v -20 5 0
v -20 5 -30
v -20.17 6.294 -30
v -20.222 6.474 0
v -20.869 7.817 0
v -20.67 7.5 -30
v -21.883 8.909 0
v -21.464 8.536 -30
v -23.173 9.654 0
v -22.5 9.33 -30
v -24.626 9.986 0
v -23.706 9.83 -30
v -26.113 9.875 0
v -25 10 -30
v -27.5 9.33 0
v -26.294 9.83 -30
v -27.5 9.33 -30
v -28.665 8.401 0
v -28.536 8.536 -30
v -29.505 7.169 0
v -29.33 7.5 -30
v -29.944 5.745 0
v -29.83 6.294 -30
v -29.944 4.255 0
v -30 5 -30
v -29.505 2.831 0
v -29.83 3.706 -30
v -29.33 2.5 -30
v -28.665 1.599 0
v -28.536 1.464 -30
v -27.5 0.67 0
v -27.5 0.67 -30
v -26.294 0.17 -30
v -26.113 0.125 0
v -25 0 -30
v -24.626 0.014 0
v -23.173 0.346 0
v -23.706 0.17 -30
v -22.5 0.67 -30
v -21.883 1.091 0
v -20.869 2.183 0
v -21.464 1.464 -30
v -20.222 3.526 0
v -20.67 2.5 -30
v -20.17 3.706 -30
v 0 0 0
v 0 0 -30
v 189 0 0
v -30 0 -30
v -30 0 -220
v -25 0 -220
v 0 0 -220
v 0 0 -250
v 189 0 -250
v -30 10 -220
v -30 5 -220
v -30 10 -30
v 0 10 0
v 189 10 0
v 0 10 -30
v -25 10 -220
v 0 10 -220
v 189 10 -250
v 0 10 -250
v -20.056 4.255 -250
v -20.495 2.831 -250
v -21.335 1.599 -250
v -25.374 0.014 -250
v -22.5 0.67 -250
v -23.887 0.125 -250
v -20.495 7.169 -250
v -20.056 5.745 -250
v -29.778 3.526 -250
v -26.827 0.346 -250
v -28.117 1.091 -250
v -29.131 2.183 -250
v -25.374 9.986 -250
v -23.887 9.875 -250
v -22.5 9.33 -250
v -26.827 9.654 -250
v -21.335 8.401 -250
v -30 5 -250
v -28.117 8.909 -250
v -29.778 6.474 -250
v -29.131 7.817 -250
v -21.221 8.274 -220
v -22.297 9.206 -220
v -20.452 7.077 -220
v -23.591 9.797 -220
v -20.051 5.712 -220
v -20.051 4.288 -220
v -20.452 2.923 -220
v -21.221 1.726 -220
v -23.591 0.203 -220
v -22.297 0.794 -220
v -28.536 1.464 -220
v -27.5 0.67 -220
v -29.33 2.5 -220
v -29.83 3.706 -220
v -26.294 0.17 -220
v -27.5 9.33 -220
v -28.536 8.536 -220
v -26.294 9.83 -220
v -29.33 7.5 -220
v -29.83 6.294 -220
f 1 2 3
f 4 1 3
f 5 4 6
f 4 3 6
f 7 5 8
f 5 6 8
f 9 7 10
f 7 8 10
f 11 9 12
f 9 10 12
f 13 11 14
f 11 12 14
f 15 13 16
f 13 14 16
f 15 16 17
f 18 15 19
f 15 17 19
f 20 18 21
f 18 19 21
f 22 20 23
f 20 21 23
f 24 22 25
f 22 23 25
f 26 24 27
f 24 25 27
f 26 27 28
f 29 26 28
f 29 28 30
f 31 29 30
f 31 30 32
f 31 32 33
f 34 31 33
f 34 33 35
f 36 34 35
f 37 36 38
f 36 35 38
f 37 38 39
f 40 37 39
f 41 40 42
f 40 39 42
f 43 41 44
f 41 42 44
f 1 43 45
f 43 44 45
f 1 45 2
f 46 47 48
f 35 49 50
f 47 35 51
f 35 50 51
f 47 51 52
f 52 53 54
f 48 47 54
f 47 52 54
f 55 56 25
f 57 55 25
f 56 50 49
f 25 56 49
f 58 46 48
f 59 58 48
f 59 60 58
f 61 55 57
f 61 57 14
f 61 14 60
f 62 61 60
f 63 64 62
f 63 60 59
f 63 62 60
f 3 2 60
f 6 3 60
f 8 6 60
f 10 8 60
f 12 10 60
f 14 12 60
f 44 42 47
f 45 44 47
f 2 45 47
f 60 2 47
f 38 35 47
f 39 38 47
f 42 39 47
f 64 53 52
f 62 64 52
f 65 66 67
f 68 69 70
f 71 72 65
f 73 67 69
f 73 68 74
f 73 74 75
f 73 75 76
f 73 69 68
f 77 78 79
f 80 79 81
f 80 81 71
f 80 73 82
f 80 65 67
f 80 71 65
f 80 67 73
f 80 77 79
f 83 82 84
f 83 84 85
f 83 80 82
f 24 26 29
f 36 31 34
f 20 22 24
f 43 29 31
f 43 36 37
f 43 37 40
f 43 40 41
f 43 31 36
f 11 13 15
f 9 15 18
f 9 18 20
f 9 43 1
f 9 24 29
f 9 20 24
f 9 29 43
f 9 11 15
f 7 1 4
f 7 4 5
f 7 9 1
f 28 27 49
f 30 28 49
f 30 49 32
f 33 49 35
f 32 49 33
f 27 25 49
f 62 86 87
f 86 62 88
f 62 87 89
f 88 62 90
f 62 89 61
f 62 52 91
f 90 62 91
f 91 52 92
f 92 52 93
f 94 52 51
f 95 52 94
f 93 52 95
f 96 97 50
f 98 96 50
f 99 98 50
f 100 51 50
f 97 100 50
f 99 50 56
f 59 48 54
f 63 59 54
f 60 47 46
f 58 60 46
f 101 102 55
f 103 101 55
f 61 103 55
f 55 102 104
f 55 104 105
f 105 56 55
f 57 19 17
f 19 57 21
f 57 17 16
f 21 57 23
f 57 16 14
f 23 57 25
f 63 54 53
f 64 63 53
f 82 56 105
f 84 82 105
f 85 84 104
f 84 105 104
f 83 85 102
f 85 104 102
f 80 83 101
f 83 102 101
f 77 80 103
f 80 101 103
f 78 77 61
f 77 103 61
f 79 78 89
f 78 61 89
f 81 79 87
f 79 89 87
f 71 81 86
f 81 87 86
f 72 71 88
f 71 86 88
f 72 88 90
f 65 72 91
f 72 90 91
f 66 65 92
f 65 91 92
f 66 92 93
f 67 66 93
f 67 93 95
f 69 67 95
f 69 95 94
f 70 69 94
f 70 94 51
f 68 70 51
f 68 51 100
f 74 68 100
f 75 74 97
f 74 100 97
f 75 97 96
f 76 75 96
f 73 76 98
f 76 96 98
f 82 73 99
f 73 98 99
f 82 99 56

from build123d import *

# Parameters (mm, degrees)
BOSS_EXTRU_1_DEPTH = 10
ESQUISSE2_R        = 5
BOSS_EXTRU_2_DEPTH = 30
ESQUISSE3_R        = 5
BOSS_EXTRU_3_DEPTH = 30


with BuildPart() as part:
    # Esquisse1 → Boss.-Extru.1 (new body)
    with BuildSketch(Plane(origin=(0, 0, 0), x_dir=(1, 0, 0), z_dir=(0, 1, 0))):
        Polygon((0, 0), (189, 0), (189, 250), (0, 250), (0, 220), (-30, 220), (-30, 30), (0, 30), align=None)
    extrude(amount=BOSS_EXTRU_1_DEPTH)

    # Esquisse2 → Boss.-Extru.2 (add)
    with BuildSketch(Plane.XY.offset(-30)):
        with Locations((-25, 5)):
            Circle(ESQUISSE2_R)
    extrude(amount=BOSS_EXTRU_2_DEPTH)

    # Esquisse3 → Boss.-Extru.3 (add)
    with BuildSketch(Plane(origin=(0, 0, -220), x_dir=(-1, 0, 0), z_dir=(0, 0, -1))):
        with Locations((25, 5)):
            Circle(ESQUISSE3_R)
    extrude(amount=BOSS_EXTRU_3_DEPTH)


solid = part.part
